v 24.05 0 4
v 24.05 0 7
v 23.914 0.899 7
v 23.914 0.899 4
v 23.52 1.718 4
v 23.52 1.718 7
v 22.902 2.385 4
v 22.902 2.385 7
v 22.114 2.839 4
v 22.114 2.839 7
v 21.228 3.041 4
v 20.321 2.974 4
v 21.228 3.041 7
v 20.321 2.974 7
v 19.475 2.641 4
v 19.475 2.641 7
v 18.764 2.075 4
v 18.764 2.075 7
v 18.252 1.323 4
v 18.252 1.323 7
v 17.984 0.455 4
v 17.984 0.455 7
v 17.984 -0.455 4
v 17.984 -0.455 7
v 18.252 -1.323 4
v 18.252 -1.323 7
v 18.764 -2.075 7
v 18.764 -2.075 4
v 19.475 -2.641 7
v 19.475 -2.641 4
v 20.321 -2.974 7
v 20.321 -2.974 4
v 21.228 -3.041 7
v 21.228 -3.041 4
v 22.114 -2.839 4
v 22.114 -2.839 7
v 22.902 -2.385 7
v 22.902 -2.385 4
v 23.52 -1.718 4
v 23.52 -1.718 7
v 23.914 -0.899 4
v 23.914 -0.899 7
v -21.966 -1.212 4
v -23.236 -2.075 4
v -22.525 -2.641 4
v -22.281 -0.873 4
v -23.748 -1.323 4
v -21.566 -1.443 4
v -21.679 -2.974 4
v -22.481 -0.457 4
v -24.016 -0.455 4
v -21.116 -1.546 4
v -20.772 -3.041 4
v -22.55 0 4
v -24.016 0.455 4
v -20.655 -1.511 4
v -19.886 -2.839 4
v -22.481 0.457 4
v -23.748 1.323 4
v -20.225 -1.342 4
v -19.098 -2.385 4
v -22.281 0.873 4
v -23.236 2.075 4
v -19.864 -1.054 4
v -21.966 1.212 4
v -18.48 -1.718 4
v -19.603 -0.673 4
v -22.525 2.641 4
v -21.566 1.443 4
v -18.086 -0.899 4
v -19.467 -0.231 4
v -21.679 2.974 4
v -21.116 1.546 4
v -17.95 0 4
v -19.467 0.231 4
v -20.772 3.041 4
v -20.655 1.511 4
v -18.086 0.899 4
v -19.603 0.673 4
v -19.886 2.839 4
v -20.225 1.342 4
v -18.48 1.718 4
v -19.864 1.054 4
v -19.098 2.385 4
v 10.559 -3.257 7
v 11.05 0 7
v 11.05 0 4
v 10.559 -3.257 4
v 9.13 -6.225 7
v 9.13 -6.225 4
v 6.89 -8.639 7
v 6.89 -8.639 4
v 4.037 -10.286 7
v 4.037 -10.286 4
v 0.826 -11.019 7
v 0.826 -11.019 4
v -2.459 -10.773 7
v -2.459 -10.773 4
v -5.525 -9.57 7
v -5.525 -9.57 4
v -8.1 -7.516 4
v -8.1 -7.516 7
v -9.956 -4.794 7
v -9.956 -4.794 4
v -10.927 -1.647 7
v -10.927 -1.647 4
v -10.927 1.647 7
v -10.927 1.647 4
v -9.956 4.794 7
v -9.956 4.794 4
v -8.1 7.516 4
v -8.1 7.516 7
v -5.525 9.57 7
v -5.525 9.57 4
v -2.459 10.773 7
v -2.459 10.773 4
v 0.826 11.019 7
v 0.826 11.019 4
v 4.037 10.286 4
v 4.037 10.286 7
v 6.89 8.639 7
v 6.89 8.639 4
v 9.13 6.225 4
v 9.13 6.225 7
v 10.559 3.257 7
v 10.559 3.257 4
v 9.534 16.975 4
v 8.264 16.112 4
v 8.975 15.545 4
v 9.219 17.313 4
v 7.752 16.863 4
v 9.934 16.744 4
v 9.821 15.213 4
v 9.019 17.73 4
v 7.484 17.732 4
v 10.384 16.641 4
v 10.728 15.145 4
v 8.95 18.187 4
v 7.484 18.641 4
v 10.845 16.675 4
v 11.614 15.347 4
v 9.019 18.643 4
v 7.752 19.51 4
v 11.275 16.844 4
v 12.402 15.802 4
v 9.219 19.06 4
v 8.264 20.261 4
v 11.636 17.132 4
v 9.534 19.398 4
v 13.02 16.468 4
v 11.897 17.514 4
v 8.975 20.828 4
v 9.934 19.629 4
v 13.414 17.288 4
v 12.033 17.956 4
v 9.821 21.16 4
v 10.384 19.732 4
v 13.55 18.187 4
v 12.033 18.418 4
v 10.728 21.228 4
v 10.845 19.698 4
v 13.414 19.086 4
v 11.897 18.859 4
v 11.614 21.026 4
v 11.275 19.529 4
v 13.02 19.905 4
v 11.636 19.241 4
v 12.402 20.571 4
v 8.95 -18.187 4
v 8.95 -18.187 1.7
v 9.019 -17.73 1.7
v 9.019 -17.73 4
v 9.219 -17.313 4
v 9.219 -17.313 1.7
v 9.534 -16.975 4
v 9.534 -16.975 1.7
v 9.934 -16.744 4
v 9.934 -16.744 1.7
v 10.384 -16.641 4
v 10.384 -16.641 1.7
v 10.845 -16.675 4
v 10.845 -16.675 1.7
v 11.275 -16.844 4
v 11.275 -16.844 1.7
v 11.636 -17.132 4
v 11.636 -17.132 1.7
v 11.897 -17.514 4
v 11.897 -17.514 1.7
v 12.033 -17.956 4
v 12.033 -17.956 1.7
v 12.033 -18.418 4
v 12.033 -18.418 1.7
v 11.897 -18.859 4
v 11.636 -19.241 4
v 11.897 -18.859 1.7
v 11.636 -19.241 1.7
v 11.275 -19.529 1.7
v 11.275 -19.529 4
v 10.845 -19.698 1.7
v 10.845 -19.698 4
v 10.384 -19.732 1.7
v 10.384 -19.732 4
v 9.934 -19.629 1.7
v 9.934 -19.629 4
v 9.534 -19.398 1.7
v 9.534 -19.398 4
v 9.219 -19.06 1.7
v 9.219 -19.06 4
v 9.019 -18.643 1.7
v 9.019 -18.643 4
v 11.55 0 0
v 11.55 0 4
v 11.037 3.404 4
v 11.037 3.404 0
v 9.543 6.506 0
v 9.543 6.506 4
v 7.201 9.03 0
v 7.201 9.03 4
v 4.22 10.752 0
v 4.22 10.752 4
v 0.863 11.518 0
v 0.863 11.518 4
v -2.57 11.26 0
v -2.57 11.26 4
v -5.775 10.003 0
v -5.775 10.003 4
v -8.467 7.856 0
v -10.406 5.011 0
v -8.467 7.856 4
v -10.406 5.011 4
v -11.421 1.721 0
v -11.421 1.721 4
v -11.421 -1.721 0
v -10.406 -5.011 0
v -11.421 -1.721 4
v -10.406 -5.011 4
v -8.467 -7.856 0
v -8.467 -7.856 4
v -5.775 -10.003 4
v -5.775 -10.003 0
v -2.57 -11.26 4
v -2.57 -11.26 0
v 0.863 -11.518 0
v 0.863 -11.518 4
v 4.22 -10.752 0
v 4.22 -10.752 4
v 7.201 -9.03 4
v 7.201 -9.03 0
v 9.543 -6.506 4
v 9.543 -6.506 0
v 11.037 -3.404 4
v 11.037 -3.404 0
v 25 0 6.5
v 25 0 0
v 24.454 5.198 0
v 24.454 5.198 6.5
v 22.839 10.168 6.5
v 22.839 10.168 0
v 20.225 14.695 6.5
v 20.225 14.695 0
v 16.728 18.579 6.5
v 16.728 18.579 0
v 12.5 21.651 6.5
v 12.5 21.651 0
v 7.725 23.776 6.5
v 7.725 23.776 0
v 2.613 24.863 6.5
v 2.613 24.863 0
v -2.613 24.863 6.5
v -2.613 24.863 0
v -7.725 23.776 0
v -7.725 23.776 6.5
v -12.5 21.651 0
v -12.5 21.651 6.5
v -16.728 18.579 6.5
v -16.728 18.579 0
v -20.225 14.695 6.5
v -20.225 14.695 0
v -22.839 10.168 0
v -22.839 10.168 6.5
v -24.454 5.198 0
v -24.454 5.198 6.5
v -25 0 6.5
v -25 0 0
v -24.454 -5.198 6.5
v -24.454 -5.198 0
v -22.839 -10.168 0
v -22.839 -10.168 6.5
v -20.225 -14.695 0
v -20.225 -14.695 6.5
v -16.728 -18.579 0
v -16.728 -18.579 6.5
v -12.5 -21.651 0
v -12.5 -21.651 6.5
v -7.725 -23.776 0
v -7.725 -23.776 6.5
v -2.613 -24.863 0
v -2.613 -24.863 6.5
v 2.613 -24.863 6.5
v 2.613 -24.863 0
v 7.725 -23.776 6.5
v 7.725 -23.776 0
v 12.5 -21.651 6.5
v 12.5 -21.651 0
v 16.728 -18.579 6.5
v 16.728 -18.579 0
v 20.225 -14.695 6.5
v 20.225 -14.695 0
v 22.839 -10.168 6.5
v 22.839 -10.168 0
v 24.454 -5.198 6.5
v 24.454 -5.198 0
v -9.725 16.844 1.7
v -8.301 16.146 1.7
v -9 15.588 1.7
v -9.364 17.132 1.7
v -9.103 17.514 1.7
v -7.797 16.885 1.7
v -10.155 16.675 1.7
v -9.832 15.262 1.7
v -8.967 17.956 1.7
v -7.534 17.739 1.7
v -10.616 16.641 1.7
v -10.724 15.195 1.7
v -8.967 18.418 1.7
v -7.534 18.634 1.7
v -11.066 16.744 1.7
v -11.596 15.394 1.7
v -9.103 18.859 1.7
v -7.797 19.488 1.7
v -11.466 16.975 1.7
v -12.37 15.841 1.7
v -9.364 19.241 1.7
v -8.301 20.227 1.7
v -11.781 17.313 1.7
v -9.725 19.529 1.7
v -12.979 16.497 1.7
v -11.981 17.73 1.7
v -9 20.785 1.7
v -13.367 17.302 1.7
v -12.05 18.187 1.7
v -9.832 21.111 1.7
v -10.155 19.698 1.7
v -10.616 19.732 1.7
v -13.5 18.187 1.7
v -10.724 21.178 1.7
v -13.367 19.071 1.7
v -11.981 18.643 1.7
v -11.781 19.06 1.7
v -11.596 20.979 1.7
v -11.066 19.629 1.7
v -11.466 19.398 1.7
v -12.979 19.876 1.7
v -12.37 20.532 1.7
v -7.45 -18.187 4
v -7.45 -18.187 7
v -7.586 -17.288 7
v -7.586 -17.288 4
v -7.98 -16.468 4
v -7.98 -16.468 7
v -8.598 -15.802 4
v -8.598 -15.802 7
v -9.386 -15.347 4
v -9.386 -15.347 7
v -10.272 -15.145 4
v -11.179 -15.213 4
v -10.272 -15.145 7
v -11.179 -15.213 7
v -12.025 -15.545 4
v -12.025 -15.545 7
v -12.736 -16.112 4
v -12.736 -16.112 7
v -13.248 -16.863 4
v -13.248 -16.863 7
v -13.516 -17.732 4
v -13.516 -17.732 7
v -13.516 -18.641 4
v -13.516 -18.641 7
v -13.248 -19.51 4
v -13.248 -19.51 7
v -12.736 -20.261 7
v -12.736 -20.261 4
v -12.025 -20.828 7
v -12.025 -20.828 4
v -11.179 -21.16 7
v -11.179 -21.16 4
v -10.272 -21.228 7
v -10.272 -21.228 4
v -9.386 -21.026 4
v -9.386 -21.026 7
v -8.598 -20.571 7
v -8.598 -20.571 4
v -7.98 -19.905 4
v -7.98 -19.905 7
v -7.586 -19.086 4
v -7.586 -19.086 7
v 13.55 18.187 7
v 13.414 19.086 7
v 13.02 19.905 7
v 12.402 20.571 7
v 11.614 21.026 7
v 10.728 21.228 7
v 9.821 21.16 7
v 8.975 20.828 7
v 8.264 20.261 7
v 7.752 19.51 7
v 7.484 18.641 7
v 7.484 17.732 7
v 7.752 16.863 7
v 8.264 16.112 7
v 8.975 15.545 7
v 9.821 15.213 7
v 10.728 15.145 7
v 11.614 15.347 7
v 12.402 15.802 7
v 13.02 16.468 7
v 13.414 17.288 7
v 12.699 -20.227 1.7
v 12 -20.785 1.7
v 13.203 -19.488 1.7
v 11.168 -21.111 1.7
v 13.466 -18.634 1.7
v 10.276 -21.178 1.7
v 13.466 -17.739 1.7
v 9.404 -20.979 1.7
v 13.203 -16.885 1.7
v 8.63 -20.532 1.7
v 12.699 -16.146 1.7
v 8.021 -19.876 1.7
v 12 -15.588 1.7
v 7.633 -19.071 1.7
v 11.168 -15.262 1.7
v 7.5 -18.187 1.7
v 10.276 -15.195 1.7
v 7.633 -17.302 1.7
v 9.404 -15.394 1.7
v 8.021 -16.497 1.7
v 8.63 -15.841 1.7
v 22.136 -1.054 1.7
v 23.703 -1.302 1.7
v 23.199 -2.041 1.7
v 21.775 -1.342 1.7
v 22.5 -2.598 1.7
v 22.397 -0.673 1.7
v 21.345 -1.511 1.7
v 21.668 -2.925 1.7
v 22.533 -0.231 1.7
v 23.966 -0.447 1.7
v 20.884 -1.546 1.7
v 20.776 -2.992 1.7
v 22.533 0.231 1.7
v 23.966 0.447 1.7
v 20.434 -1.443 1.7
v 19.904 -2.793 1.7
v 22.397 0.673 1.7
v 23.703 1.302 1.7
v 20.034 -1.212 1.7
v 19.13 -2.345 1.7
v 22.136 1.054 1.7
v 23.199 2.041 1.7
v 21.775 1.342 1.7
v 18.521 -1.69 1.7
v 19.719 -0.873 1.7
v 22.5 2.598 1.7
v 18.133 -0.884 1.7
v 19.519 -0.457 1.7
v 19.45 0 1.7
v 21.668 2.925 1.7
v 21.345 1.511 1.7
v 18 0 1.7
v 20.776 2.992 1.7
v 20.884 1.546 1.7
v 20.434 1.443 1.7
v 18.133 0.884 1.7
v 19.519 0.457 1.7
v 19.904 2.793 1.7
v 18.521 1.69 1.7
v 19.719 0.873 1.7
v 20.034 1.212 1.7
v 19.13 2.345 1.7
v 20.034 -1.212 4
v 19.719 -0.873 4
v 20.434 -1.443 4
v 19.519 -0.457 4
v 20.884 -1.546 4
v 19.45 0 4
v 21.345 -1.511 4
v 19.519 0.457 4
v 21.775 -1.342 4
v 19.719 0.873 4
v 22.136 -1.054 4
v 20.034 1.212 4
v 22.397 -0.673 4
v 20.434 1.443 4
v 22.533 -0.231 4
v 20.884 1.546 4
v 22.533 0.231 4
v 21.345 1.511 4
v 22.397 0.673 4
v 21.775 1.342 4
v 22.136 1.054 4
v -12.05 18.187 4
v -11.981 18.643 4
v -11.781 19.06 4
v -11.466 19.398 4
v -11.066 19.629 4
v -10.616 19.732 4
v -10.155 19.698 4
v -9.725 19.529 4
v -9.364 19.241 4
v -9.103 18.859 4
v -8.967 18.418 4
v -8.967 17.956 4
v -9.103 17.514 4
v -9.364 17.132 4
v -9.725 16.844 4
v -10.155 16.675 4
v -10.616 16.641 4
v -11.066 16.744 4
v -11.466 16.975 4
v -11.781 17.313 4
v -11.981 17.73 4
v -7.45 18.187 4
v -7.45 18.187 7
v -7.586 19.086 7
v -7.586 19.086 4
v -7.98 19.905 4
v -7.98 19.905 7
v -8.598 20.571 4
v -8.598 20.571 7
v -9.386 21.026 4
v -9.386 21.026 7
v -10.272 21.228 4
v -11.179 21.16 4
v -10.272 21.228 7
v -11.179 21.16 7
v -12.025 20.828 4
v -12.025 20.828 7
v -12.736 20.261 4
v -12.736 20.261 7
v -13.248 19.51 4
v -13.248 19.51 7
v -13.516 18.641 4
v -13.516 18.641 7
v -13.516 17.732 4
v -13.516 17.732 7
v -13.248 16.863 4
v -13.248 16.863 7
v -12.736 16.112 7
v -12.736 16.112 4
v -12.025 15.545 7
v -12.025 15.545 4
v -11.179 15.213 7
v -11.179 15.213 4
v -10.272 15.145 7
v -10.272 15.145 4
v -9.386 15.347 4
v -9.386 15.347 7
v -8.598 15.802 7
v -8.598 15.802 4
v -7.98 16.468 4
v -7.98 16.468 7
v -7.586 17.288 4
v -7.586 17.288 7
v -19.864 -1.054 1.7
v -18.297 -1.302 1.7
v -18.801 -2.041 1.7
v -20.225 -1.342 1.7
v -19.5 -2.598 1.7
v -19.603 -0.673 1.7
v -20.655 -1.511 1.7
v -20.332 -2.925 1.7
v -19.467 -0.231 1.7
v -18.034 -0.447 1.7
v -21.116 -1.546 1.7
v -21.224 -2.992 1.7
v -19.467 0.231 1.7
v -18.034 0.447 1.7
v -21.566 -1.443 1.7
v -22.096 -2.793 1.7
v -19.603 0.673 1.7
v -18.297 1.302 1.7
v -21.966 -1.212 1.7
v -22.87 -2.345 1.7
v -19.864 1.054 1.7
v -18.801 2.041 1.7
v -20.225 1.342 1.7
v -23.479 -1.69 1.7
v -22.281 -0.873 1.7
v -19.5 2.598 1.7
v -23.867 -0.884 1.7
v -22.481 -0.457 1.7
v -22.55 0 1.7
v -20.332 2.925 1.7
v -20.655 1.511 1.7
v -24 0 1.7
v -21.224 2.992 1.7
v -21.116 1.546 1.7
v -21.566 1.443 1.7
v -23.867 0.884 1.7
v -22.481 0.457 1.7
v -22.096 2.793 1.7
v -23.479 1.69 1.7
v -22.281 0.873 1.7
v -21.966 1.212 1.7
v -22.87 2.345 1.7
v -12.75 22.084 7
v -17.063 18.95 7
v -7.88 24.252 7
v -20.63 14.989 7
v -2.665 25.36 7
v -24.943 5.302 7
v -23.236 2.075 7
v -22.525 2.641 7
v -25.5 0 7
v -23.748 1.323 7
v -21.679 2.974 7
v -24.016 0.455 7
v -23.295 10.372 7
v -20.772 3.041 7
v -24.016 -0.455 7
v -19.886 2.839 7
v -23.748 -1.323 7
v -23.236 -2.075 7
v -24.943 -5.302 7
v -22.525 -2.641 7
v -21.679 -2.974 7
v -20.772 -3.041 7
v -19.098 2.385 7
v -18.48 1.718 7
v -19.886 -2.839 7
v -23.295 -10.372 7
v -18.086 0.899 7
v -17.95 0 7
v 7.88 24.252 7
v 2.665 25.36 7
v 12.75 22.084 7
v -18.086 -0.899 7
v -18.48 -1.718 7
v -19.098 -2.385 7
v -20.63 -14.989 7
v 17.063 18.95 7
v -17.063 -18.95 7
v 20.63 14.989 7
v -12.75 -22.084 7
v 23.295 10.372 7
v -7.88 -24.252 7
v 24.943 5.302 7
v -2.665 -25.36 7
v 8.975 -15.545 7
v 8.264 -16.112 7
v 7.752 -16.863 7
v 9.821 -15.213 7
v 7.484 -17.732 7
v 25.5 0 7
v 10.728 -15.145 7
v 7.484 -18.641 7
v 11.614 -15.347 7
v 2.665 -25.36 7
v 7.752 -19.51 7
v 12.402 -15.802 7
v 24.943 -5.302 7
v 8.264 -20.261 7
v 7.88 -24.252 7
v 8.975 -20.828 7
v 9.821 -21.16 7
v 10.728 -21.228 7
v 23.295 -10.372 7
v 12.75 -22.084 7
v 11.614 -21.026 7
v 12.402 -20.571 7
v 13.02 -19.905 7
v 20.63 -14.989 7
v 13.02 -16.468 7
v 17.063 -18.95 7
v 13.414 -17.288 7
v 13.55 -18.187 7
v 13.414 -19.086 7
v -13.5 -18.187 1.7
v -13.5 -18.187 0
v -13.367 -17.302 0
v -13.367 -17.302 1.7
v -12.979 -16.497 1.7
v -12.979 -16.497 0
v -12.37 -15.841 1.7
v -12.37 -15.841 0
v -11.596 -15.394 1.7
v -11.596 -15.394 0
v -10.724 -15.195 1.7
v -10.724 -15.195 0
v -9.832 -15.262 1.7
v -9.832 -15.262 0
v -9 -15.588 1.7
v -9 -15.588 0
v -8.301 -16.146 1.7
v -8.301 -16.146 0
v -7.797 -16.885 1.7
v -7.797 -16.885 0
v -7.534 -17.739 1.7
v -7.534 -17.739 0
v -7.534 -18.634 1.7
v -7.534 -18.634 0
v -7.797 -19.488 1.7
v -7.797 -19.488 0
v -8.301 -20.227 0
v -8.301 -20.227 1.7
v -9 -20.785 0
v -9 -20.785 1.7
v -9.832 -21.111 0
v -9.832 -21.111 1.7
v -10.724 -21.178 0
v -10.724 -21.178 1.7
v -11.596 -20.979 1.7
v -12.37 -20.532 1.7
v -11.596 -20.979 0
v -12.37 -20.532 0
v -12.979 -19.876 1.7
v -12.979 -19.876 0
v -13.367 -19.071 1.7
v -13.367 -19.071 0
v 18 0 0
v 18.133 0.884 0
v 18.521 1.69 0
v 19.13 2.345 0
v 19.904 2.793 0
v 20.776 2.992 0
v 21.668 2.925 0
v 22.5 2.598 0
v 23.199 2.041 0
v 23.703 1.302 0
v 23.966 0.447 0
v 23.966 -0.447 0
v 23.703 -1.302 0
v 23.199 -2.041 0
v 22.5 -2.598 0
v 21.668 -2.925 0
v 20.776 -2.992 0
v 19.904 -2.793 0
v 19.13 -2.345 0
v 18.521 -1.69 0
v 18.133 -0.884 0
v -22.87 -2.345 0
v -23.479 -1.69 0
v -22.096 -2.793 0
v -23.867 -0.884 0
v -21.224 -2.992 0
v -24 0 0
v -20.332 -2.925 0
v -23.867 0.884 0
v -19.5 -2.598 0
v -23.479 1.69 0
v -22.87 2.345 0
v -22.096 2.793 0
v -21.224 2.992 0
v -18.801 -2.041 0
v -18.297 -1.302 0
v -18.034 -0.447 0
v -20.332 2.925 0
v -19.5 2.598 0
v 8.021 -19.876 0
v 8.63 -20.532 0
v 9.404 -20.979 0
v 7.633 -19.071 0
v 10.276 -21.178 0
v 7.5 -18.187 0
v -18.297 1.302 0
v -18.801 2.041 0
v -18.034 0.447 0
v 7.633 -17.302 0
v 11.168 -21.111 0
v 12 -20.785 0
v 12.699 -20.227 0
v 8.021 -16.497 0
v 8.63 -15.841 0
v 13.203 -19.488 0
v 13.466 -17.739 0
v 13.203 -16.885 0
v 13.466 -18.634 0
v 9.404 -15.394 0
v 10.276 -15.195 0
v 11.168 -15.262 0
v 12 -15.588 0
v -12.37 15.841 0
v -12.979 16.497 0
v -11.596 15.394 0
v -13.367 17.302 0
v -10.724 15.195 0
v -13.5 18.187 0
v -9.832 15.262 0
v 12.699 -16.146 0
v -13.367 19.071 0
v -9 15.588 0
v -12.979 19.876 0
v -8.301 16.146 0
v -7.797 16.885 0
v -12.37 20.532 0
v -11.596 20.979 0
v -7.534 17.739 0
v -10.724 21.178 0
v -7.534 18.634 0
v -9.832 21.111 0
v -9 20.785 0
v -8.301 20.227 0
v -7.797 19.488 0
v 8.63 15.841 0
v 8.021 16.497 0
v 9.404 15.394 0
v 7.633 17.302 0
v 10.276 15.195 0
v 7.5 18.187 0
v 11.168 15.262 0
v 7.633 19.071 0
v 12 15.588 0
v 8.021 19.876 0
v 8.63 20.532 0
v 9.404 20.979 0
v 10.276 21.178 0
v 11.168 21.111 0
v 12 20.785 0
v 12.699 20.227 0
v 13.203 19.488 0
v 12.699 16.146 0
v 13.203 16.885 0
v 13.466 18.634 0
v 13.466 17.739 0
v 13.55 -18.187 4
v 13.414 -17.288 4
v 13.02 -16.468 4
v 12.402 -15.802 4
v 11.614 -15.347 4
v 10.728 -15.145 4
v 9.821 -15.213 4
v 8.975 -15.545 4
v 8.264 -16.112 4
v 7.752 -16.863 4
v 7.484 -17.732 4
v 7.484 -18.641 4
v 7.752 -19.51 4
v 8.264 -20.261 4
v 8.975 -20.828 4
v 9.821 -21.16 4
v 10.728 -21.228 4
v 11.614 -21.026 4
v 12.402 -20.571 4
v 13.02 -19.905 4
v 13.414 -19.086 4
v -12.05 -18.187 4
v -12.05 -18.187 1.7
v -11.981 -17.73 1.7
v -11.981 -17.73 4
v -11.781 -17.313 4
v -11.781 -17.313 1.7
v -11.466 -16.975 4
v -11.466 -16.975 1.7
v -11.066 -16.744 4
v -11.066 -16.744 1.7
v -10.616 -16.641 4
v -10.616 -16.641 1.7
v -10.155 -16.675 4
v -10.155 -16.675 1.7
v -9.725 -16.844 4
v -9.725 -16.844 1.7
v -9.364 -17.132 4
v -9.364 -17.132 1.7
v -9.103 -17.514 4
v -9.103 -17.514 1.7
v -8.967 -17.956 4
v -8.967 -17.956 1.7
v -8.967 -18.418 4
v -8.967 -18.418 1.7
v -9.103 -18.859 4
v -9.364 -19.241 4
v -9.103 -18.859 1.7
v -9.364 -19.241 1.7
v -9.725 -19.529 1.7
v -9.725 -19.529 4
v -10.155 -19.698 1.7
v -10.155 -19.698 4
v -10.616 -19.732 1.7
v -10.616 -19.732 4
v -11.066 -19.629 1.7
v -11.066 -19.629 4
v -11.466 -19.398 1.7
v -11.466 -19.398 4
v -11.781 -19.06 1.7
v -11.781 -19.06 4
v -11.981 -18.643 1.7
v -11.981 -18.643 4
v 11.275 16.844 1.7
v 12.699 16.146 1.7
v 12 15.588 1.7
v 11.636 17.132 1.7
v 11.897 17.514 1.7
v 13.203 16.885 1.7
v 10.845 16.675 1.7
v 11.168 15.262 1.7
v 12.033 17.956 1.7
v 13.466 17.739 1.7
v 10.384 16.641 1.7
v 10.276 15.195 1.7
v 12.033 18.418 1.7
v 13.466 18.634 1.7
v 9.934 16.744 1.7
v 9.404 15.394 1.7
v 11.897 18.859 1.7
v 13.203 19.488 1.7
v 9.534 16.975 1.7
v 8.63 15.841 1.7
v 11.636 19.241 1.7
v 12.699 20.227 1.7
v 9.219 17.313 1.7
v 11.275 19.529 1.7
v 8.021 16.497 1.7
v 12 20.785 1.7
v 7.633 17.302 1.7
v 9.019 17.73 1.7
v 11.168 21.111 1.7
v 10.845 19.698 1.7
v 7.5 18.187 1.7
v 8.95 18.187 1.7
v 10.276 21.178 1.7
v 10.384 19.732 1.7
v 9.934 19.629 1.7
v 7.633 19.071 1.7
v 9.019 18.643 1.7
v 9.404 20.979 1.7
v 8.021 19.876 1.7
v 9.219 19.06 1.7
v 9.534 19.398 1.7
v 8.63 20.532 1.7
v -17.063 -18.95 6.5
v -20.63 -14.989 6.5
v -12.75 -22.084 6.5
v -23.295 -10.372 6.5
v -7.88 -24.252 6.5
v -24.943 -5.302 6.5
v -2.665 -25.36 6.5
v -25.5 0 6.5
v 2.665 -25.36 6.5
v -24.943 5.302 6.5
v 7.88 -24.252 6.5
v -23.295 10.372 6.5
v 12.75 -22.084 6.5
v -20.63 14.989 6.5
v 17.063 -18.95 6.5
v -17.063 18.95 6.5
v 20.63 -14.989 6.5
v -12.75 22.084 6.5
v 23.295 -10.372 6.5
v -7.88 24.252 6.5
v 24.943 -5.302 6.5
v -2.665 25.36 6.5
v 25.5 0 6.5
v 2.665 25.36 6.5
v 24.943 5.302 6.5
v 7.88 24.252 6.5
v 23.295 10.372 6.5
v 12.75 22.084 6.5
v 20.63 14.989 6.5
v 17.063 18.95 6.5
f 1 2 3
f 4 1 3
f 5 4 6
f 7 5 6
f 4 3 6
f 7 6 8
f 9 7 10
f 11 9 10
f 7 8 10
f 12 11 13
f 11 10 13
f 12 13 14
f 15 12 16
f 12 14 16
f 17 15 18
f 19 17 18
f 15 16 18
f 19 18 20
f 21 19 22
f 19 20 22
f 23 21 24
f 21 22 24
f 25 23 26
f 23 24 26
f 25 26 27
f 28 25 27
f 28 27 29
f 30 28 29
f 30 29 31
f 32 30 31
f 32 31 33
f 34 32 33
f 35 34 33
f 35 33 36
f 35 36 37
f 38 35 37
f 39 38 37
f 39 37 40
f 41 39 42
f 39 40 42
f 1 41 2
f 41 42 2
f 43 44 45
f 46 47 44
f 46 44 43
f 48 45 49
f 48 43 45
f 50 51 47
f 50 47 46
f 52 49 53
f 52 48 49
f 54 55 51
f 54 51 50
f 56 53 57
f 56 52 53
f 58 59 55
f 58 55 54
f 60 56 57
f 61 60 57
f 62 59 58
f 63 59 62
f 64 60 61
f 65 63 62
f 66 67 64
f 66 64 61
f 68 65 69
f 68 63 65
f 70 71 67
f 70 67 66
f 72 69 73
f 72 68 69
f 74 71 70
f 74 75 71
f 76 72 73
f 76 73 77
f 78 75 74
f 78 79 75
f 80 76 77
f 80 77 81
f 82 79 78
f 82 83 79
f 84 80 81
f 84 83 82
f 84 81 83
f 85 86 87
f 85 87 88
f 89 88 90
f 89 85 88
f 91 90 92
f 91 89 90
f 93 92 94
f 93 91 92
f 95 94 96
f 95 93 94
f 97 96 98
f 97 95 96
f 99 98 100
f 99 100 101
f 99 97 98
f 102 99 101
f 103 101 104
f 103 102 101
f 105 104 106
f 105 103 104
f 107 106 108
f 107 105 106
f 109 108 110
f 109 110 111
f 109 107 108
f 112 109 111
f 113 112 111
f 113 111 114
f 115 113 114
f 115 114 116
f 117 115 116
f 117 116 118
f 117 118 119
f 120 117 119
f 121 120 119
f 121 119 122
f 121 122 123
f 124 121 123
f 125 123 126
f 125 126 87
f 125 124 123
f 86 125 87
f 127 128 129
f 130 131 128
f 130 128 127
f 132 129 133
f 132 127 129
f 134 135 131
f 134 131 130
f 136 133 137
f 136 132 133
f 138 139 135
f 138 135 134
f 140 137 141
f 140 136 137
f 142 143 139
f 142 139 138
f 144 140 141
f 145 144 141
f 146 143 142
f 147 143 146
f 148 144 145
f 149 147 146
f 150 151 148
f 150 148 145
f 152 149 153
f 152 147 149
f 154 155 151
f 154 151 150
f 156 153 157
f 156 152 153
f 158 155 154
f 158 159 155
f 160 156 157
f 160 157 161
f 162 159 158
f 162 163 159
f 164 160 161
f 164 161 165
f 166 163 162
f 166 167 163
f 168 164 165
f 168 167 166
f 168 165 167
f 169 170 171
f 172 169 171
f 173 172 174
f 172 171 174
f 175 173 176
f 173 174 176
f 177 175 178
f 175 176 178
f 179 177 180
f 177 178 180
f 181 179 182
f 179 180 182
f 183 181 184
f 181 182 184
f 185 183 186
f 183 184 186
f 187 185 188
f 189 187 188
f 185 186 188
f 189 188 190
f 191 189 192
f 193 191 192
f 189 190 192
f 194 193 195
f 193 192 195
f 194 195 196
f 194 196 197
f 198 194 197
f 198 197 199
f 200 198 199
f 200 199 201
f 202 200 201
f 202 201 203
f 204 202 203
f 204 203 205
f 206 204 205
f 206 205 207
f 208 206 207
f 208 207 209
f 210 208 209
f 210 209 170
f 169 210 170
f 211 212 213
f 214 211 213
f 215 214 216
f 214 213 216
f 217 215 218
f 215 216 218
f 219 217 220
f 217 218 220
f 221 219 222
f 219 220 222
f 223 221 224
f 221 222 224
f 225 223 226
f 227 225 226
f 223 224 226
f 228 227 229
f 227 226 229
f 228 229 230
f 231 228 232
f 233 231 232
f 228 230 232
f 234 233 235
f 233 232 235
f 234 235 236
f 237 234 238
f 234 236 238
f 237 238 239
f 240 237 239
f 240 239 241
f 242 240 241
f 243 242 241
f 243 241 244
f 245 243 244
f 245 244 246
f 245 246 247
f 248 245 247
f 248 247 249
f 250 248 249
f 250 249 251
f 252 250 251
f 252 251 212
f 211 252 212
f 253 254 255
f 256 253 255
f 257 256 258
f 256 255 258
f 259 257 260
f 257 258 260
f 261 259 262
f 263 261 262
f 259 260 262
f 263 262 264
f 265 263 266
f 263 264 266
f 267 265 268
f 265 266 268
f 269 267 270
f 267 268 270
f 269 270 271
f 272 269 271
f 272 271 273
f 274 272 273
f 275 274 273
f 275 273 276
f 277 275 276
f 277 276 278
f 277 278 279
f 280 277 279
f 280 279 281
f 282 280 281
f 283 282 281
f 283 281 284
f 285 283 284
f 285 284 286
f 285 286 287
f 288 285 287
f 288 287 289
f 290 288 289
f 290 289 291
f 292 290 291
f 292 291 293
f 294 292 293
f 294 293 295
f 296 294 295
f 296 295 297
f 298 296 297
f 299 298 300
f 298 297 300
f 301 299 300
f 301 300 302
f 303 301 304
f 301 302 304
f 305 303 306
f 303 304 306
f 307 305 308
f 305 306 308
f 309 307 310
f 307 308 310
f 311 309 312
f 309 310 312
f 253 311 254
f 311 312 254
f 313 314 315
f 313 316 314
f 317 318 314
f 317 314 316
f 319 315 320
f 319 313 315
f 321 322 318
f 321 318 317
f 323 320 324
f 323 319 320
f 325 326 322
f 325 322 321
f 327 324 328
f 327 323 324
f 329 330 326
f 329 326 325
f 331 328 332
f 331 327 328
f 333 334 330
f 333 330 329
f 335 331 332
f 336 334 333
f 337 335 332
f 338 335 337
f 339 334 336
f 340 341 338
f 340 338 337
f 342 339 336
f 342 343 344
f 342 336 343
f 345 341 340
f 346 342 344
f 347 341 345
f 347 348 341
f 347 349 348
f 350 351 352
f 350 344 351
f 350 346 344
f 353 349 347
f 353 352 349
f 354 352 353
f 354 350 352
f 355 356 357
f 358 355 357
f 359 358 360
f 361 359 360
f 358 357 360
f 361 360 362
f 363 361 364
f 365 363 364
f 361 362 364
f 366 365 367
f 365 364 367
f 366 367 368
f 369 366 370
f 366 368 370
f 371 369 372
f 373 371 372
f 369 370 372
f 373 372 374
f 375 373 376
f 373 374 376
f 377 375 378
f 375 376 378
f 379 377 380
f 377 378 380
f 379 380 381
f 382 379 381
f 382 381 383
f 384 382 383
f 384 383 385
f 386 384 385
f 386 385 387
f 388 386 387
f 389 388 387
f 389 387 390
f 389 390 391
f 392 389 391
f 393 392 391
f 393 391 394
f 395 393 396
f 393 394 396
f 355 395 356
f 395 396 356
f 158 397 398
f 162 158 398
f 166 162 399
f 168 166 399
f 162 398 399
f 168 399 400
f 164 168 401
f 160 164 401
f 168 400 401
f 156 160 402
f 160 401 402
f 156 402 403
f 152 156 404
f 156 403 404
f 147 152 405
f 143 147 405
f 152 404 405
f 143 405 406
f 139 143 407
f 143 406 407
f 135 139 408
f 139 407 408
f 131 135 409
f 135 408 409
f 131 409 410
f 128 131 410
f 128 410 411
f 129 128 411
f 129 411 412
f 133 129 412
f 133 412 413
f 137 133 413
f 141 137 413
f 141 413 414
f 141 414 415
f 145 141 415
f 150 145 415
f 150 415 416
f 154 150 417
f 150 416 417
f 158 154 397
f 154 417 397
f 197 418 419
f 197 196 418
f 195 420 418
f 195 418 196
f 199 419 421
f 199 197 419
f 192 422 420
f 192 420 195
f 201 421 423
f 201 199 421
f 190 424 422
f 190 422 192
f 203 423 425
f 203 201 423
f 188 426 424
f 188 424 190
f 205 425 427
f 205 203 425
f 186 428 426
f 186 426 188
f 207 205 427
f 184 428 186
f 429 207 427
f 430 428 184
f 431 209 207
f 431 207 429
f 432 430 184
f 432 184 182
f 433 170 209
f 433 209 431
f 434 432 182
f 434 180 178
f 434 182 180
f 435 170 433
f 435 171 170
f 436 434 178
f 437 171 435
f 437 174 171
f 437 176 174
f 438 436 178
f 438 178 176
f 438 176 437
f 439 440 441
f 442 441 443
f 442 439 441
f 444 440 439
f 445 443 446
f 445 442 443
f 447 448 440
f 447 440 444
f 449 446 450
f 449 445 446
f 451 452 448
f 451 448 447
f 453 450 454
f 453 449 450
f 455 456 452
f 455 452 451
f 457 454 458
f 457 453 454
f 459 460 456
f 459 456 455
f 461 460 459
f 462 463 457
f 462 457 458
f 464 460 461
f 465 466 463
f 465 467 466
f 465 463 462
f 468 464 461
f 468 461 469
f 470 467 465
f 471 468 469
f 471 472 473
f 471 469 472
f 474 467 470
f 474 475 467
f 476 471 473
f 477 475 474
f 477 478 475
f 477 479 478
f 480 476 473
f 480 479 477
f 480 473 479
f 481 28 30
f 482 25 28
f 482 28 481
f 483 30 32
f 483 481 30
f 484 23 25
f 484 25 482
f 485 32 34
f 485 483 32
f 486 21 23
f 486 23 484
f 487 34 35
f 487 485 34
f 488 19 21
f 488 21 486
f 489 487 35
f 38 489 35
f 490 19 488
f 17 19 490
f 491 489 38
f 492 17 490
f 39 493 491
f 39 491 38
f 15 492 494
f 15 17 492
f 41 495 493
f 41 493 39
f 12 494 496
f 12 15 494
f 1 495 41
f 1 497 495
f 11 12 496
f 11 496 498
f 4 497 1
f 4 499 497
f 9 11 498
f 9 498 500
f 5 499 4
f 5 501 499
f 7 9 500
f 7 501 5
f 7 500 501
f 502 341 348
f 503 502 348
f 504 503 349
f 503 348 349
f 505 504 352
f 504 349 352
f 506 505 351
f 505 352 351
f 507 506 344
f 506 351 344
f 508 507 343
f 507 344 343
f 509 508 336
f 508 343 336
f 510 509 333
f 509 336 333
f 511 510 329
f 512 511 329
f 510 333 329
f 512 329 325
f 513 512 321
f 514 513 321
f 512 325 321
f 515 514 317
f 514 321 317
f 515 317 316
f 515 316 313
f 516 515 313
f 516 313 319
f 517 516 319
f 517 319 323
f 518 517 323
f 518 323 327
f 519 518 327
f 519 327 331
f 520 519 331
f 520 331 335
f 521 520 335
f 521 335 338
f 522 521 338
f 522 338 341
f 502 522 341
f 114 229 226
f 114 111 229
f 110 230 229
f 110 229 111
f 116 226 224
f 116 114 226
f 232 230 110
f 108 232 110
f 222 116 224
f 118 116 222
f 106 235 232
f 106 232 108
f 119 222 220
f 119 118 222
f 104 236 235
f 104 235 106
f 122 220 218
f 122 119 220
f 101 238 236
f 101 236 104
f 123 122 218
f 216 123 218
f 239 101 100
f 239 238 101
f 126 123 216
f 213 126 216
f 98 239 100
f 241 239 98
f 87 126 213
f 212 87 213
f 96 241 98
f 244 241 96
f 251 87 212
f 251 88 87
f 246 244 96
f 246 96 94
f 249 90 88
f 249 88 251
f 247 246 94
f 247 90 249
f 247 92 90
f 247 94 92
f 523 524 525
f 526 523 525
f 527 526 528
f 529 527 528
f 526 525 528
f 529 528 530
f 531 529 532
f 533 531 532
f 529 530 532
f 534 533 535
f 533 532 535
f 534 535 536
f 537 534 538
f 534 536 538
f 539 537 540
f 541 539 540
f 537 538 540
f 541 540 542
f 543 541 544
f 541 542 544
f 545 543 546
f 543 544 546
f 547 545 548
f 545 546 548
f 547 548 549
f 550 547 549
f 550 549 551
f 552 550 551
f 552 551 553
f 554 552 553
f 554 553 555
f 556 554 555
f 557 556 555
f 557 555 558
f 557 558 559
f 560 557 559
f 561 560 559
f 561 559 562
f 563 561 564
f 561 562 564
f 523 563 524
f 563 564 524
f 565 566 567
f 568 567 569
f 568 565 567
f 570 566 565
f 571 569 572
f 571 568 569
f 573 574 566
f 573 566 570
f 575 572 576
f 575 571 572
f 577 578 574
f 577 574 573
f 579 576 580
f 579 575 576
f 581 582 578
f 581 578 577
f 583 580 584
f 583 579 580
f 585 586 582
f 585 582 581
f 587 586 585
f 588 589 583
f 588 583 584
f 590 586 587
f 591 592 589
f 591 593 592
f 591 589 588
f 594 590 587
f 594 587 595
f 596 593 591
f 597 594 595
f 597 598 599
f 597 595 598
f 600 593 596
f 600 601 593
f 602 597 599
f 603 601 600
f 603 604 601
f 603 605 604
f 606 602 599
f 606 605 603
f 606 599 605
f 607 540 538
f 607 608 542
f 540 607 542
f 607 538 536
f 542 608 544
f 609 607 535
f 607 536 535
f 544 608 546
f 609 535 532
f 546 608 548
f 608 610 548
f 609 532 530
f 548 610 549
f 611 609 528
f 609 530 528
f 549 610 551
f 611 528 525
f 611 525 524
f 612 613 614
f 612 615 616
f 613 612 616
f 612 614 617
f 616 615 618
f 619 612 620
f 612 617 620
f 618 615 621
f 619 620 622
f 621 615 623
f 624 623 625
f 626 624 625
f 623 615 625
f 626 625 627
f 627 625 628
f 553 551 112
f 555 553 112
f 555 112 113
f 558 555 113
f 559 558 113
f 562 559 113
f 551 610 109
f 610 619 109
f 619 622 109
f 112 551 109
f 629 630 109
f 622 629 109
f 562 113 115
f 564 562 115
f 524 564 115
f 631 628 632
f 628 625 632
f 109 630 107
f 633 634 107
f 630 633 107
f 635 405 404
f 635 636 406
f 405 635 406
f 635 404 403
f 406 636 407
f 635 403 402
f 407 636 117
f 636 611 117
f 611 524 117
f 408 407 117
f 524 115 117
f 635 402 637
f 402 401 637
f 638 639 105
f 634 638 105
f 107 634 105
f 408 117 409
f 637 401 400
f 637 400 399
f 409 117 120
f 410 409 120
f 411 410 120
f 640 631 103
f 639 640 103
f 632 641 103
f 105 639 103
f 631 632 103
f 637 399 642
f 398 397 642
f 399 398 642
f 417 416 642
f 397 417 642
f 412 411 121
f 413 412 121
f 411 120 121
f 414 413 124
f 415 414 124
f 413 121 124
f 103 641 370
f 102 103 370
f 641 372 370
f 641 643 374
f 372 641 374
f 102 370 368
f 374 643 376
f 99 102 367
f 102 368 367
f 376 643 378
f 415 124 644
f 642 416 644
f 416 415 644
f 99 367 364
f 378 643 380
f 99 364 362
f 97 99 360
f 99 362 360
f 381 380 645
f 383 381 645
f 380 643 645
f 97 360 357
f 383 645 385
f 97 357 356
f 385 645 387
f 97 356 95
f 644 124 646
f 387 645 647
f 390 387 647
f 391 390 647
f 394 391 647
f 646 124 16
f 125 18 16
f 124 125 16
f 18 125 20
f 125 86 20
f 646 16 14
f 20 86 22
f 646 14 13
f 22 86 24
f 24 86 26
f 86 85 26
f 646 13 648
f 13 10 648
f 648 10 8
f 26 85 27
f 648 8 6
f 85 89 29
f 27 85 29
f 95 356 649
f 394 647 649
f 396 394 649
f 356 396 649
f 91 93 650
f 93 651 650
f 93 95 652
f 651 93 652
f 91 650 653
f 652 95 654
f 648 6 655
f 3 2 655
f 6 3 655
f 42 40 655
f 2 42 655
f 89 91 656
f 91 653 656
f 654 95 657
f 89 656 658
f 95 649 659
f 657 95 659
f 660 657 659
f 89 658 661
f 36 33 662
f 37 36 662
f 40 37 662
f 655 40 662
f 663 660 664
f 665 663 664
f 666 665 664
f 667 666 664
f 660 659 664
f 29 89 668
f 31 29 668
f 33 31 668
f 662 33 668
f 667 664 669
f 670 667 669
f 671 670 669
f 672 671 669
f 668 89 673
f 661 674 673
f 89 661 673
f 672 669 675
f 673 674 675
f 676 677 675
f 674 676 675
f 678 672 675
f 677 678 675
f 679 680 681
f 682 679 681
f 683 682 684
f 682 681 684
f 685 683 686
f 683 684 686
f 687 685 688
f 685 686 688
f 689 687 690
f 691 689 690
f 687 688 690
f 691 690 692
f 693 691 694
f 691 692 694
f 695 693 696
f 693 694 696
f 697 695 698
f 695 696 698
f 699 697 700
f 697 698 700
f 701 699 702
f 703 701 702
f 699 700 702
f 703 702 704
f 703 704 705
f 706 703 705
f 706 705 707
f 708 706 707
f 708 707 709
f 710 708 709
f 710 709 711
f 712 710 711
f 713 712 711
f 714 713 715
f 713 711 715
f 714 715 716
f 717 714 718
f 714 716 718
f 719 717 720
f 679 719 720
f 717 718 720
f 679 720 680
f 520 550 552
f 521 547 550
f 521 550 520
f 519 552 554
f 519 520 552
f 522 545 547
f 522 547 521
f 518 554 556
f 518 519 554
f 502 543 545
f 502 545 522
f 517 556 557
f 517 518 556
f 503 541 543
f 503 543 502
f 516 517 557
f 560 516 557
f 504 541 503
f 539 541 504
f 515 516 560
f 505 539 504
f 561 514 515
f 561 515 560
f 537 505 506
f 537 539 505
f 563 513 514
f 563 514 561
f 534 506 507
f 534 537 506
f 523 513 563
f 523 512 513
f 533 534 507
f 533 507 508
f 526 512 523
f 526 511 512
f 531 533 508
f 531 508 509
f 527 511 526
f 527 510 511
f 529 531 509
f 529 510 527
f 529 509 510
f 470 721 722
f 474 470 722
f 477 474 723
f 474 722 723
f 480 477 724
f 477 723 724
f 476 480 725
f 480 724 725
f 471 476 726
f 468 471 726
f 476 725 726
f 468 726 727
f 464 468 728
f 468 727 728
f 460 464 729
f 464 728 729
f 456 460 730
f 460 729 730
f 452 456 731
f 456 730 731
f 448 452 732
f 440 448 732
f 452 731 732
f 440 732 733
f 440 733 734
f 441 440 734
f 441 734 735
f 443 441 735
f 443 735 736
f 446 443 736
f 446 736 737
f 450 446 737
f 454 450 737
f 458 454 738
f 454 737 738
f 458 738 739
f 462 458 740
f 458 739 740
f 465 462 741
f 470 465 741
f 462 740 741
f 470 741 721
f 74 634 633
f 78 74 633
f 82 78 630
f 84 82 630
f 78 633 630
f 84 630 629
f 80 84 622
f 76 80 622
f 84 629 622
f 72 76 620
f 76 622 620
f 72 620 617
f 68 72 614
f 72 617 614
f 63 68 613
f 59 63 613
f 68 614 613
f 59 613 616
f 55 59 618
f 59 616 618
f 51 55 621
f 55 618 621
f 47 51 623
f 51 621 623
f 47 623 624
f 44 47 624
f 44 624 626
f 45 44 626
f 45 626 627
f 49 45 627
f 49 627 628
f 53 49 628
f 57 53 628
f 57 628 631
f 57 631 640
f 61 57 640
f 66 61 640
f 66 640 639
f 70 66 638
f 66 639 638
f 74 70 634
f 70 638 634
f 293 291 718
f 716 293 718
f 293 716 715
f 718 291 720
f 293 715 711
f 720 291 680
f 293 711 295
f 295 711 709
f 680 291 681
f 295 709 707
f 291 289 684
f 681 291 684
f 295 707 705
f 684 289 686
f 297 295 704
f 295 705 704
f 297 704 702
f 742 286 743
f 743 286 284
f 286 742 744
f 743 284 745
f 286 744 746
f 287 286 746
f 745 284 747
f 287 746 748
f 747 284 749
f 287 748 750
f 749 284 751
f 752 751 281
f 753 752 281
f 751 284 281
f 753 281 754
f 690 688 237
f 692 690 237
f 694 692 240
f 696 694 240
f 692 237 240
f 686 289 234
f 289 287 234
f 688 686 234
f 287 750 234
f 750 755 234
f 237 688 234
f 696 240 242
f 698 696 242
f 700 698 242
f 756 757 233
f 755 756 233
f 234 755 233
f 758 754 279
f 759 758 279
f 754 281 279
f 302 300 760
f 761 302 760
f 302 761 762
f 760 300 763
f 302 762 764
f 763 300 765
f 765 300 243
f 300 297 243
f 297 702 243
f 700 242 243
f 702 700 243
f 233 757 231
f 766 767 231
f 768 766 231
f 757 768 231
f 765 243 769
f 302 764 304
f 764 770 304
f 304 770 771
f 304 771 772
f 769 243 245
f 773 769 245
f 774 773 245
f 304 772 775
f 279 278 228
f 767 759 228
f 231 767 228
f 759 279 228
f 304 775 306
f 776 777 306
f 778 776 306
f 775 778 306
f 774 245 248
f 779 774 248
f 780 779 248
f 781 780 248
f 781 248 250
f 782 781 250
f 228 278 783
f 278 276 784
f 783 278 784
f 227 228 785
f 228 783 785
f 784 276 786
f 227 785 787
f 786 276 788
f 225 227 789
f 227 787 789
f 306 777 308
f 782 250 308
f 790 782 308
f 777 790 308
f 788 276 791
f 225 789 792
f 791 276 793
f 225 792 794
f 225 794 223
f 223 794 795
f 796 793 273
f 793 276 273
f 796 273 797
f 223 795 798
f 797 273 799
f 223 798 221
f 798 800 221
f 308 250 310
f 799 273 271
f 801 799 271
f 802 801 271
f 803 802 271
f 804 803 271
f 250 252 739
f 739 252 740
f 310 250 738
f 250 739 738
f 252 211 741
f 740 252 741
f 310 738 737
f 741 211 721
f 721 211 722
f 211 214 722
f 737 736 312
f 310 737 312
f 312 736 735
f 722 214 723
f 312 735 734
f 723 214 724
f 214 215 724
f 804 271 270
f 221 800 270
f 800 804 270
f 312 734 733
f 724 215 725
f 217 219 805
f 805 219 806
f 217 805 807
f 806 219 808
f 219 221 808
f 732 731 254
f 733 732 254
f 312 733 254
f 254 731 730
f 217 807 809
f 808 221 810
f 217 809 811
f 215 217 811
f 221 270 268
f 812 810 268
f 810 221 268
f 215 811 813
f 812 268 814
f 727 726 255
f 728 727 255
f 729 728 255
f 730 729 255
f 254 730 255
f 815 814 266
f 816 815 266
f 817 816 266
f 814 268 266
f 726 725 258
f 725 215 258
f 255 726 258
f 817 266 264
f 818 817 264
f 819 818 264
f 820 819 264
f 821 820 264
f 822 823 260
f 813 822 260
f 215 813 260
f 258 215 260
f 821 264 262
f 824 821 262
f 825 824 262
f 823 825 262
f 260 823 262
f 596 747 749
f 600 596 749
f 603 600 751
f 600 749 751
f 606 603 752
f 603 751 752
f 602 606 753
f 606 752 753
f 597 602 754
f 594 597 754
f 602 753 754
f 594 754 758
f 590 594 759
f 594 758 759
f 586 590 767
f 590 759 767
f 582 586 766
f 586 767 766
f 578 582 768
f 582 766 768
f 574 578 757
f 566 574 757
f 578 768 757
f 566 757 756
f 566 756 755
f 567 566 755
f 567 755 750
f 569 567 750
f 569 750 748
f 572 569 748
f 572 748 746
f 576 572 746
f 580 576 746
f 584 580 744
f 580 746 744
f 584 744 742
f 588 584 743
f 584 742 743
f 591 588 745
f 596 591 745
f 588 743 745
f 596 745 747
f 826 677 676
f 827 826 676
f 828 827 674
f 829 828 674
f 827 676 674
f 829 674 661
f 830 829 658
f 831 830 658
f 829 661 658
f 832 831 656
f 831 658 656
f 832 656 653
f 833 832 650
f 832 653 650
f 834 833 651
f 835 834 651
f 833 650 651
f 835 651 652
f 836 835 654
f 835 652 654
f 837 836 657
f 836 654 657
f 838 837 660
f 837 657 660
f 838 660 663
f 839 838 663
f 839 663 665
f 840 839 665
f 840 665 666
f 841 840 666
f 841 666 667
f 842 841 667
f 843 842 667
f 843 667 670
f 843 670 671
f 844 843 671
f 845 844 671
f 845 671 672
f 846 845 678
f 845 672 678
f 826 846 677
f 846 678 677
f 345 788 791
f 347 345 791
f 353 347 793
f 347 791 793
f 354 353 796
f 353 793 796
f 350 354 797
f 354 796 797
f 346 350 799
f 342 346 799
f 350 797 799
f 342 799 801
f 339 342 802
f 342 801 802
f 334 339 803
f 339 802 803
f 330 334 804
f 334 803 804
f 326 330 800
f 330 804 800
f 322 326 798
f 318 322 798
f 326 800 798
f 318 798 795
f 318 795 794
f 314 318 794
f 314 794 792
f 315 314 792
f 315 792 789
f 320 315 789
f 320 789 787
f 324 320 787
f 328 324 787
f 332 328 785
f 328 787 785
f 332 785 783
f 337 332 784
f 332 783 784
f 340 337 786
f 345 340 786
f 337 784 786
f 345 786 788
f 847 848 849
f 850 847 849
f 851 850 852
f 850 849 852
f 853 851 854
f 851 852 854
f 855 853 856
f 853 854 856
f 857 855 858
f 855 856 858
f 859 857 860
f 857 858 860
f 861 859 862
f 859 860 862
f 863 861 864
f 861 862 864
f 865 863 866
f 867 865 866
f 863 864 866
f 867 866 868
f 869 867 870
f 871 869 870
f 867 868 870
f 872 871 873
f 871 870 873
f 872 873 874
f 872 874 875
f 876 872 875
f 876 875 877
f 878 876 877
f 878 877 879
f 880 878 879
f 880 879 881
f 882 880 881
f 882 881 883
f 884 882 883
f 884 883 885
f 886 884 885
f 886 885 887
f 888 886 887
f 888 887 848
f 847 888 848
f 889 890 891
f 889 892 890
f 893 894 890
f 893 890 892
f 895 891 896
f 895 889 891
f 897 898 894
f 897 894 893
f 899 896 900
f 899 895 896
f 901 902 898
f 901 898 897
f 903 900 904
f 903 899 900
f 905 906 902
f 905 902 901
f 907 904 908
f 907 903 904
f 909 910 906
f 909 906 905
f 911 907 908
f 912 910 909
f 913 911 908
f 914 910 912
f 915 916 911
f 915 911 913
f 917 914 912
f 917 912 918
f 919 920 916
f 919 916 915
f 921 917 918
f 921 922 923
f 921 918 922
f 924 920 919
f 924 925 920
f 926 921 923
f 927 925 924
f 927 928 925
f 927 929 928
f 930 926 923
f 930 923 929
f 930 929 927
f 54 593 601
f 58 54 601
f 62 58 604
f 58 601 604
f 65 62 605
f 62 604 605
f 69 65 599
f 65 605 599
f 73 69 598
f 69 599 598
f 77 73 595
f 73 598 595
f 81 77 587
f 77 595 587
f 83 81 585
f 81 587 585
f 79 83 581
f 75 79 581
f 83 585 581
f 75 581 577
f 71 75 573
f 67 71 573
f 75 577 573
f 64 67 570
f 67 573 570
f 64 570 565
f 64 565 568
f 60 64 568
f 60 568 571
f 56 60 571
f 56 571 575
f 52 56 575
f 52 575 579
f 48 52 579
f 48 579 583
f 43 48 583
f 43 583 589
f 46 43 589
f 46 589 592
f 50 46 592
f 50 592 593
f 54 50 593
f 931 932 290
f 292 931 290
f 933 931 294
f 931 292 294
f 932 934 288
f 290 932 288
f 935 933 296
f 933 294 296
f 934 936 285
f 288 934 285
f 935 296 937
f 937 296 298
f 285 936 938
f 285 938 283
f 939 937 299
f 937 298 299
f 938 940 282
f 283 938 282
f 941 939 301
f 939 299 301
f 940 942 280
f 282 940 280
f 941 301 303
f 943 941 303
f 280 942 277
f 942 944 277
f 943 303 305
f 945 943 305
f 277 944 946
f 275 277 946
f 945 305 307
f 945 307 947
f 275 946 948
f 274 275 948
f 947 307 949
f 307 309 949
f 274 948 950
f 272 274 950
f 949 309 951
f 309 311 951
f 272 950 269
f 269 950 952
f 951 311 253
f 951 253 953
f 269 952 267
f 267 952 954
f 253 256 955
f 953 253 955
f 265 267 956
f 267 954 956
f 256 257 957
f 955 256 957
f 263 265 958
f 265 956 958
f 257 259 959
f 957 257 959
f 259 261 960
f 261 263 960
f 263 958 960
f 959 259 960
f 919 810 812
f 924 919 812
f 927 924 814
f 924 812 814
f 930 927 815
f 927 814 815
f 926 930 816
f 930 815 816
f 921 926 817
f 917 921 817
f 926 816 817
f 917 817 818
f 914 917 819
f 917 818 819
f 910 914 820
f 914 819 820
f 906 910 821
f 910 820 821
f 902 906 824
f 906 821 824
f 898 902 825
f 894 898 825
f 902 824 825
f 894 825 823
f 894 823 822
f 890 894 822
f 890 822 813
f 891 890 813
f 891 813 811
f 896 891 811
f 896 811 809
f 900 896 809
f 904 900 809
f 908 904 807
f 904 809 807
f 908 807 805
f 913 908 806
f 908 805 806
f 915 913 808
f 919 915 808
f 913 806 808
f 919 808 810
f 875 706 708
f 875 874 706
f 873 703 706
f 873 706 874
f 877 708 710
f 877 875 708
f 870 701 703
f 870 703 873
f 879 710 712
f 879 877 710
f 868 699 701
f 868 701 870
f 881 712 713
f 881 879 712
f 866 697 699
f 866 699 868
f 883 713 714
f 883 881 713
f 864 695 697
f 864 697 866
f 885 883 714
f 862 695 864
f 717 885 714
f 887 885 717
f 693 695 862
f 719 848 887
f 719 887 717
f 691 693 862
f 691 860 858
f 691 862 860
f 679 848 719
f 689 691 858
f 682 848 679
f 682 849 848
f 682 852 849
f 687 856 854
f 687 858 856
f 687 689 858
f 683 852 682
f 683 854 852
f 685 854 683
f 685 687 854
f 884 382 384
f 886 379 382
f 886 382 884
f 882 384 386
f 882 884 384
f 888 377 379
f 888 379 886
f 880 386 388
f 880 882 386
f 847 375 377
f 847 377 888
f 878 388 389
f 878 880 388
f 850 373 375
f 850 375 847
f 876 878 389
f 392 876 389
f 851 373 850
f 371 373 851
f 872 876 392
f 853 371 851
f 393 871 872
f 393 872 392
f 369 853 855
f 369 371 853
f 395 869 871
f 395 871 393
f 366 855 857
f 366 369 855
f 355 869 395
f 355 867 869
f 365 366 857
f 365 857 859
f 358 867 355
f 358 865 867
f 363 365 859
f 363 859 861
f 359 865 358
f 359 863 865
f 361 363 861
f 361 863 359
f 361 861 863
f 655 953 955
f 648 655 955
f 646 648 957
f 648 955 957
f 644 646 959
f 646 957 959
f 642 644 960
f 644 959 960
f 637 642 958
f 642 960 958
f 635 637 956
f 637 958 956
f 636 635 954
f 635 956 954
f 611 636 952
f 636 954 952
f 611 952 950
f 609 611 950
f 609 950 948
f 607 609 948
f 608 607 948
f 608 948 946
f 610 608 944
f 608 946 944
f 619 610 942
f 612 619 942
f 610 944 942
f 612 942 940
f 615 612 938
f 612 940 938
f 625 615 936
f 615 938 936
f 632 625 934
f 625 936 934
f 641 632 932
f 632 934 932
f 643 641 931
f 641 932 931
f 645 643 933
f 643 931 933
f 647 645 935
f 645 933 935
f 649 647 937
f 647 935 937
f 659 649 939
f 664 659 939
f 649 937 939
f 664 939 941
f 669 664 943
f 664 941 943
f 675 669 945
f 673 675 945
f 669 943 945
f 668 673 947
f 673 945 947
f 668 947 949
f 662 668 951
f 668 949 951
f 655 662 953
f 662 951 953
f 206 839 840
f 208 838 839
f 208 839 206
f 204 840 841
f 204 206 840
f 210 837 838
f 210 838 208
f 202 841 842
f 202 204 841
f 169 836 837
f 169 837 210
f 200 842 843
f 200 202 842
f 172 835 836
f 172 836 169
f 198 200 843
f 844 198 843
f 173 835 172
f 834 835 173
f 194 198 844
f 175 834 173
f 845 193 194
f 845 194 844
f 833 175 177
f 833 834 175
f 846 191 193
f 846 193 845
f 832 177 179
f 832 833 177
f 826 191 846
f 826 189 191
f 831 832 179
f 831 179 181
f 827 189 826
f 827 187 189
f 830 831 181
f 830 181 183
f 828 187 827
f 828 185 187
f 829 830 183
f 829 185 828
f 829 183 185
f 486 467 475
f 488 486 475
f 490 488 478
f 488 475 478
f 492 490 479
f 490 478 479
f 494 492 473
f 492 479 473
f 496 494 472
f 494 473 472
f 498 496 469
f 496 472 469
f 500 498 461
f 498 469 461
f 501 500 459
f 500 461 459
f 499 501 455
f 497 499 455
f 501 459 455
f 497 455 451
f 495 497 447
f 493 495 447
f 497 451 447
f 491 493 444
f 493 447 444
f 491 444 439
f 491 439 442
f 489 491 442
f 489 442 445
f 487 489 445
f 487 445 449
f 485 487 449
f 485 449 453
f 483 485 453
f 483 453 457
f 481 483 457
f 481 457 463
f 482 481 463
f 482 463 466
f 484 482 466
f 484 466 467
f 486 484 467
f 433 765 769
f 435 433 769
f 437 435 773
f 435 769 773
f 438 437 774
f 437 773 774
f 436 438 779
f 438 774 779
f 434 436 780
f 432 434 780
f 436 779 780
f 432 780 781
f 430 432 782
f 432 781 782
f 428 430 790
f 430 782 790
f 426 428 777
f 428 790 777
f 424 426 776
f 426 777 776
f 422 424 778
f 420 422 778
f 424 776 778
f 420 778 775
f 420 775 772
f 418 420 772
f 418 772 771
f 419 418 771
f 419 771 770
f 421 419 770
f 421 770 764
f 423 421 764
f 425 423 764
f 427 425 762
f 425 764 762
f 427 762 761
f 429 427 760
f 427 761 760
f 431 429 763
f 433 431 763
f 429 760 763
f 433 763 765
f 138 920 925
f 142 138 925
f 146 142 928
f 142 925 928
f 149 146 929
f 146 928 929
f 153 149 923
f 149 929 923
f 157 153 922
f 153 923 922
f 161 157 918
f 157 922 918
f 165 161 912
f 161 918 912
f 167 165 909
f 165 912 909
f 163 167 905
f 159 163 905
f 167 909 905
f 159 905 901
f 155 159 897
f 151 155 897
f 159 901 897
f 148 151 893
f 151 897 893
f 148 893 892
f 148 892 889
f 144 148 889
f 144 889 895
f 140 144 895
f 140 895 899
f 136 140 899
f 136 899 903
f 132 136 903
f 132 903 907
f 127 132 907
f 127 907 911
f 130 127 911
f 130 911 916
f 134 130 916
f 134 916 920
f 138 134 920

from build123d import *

# Parameters (mm, degrees)
SKETCH2_R                           = 25
BOSS_EXTRUDE1_DEPTH                 = 7
SKETCH3_R                           = 3.05
DOWEL_PIN_CUTOUT_DEPTH              = 3
MAIN_START                          = -0.5
SKETCH4_R                           = 25.5
SKETCH4_R_2                         = 25
MAIN_HOUSING_BEARING_RETAINER_DEPTH = 0.5
SKETCH5_R                           = 1.55
M3_THRU_DEPTH                       = 37.735541373
SKETCH6_R                           = 3
M3_BUTTON_HEAD_CUTOUT_DEPTH         = 1.7
SKETCH8_R                           = 11.55
INPUT_SHAFT_BEARING_CUTOUT_DEPTH    = 37.735541373
INPUT_START                         = -7
SKETCH9_R                           = 11.55
SKETCH9_R_2                         = 11.05
INPUT_SHAFT_BEARING_RETAINER_DEPTH  = 3


with BuildPart() as part:
    # Sketch2 → Boss-Extrude1 (new body)
    with BuildSketch(Plane.XY):
        Circle(SKETCH2_R)
    extrude(amount=BOSS_EXTRUDE1_DEPTH)

    # Sketch3 → Dowel Pin Cutout (cut)
    with BuildSketch(Plane.XY.offset(7)):
        with Locations((-21, 0)):
            Circle(SKETCH3_R)
        with Locations((-10.5, 18.186533479)):
            Circle(SKETCH3_R)
        with Locations((10.5, 18.186533479)):
            Circle(SKETCH3_R)
        with Locations((21, 0)):
            Circle(SKETCH3_R)
        with Locations((10.5, -18.186533479)):
            Circle(SKETCH3_R)
        with Locations((-10.5, -18.186533479)):
            Circle(SKETCH3_R)
    extrude(amount=-DOWEL_PIN_CUTOUT_DEPTH, mode=Mode.SUBTRACT)

    # Sketch4 → Main Housing Bearing Retainer (add)
    with BuildSketch(Plane.XY.offset(7).offset(MAIN_START)):
        Circle(SKETCH4_R)
        Circle(SKETCH4_R_2, mode=Mode.SUBTRACT)
    extrude(amount=MAIN_HOUSING_BEARING_RETAINER_DEPTH)

    # Sketch5 → M3 Thru (cut, through all)
    with BuildSketch(Plane(origin=(0, 0, 0), x_dir=(-1, 0, 0), z_dir=(0, 0, -1))):
        with Locations((-21, 0)):
            Circle(SKETCH5_R)
        with Locations((-10.5, 18.186533479)):
            Circle(SKETCH5_R)
        with Locations((10.5, 18.186533479)):
            Circle(SKETCH5_R)
        with Locations((21, 0)):
            Circle(SKETCH5_R)
        with Locations((10.5, -18.186533479)):
            Circle(SKETCH5_R)
        with Locations((-10.5, -18.186533479)):
            Circle(SKETCH5_R)
    extrude(amount=-M3_THRU_DEPTH, mode=Mode.SUBTRACT)

    # Sketch6 → M3 Button Head Cutout (cut)
    with BuildSketch(Plane(origin=(0, 0, 0), x_dir=(-1, 0, 0), z_dir=(0, 0, -1))):
        with Locations((-21, 0)):
            Circle(SKETCH6_R)
        with Locations((-10.5, 18.186533479)):
            Circle(SKETCH6_R)
        with Locations((10.5, 18.186533479)):
            Circle(SKETCH6_R)
        with Locations((21, 0)):
            Circle(SKETCH6_R)
        with Locations((10.5, -18.186533479)):
            Circle(SKETCH6_R)
        with Locations((-10.5, -18.186533479)):
            Circle(SKETCH6_R)
    extrude(amount=-M3_BUTTON_HEAD_CUTOUT_DEPTH, mode=Mode.SUBTRACT)

    # Sketch8 → Input Shaft Bearing Cutout (cut, through all)
    with BuildSketch(Plane.XY.offset(7)):
        Circle(SKETCH8_R)
    extrude(amount=-INPUT_SHAFT_BEARING_CUTOUT_DEPTH, mode=Mode.SUBTRACT)

    # Sketch9 → Input Shaft Bearing Retainer (add)
    with BuildSketch(Plane(origin=(0, 0, 0), x_dir=(-1, 0, 0), z_dir=(0, 0, -1)).offset(INPUT_START)):
        with Locations(Location((0, 0, 0), (0, 0, 180))):
            Circle(SKETCH9_R)
        with Locations(Location((0, 0, 0), (0, 0, 180))):
            Circle(SKETCH9_R_2, mode=Mode.SUBTRACT)
    extrude(amount=INPUT_SHAFT_BEARING_RETAINER_DEPTH)


solid = part.part
